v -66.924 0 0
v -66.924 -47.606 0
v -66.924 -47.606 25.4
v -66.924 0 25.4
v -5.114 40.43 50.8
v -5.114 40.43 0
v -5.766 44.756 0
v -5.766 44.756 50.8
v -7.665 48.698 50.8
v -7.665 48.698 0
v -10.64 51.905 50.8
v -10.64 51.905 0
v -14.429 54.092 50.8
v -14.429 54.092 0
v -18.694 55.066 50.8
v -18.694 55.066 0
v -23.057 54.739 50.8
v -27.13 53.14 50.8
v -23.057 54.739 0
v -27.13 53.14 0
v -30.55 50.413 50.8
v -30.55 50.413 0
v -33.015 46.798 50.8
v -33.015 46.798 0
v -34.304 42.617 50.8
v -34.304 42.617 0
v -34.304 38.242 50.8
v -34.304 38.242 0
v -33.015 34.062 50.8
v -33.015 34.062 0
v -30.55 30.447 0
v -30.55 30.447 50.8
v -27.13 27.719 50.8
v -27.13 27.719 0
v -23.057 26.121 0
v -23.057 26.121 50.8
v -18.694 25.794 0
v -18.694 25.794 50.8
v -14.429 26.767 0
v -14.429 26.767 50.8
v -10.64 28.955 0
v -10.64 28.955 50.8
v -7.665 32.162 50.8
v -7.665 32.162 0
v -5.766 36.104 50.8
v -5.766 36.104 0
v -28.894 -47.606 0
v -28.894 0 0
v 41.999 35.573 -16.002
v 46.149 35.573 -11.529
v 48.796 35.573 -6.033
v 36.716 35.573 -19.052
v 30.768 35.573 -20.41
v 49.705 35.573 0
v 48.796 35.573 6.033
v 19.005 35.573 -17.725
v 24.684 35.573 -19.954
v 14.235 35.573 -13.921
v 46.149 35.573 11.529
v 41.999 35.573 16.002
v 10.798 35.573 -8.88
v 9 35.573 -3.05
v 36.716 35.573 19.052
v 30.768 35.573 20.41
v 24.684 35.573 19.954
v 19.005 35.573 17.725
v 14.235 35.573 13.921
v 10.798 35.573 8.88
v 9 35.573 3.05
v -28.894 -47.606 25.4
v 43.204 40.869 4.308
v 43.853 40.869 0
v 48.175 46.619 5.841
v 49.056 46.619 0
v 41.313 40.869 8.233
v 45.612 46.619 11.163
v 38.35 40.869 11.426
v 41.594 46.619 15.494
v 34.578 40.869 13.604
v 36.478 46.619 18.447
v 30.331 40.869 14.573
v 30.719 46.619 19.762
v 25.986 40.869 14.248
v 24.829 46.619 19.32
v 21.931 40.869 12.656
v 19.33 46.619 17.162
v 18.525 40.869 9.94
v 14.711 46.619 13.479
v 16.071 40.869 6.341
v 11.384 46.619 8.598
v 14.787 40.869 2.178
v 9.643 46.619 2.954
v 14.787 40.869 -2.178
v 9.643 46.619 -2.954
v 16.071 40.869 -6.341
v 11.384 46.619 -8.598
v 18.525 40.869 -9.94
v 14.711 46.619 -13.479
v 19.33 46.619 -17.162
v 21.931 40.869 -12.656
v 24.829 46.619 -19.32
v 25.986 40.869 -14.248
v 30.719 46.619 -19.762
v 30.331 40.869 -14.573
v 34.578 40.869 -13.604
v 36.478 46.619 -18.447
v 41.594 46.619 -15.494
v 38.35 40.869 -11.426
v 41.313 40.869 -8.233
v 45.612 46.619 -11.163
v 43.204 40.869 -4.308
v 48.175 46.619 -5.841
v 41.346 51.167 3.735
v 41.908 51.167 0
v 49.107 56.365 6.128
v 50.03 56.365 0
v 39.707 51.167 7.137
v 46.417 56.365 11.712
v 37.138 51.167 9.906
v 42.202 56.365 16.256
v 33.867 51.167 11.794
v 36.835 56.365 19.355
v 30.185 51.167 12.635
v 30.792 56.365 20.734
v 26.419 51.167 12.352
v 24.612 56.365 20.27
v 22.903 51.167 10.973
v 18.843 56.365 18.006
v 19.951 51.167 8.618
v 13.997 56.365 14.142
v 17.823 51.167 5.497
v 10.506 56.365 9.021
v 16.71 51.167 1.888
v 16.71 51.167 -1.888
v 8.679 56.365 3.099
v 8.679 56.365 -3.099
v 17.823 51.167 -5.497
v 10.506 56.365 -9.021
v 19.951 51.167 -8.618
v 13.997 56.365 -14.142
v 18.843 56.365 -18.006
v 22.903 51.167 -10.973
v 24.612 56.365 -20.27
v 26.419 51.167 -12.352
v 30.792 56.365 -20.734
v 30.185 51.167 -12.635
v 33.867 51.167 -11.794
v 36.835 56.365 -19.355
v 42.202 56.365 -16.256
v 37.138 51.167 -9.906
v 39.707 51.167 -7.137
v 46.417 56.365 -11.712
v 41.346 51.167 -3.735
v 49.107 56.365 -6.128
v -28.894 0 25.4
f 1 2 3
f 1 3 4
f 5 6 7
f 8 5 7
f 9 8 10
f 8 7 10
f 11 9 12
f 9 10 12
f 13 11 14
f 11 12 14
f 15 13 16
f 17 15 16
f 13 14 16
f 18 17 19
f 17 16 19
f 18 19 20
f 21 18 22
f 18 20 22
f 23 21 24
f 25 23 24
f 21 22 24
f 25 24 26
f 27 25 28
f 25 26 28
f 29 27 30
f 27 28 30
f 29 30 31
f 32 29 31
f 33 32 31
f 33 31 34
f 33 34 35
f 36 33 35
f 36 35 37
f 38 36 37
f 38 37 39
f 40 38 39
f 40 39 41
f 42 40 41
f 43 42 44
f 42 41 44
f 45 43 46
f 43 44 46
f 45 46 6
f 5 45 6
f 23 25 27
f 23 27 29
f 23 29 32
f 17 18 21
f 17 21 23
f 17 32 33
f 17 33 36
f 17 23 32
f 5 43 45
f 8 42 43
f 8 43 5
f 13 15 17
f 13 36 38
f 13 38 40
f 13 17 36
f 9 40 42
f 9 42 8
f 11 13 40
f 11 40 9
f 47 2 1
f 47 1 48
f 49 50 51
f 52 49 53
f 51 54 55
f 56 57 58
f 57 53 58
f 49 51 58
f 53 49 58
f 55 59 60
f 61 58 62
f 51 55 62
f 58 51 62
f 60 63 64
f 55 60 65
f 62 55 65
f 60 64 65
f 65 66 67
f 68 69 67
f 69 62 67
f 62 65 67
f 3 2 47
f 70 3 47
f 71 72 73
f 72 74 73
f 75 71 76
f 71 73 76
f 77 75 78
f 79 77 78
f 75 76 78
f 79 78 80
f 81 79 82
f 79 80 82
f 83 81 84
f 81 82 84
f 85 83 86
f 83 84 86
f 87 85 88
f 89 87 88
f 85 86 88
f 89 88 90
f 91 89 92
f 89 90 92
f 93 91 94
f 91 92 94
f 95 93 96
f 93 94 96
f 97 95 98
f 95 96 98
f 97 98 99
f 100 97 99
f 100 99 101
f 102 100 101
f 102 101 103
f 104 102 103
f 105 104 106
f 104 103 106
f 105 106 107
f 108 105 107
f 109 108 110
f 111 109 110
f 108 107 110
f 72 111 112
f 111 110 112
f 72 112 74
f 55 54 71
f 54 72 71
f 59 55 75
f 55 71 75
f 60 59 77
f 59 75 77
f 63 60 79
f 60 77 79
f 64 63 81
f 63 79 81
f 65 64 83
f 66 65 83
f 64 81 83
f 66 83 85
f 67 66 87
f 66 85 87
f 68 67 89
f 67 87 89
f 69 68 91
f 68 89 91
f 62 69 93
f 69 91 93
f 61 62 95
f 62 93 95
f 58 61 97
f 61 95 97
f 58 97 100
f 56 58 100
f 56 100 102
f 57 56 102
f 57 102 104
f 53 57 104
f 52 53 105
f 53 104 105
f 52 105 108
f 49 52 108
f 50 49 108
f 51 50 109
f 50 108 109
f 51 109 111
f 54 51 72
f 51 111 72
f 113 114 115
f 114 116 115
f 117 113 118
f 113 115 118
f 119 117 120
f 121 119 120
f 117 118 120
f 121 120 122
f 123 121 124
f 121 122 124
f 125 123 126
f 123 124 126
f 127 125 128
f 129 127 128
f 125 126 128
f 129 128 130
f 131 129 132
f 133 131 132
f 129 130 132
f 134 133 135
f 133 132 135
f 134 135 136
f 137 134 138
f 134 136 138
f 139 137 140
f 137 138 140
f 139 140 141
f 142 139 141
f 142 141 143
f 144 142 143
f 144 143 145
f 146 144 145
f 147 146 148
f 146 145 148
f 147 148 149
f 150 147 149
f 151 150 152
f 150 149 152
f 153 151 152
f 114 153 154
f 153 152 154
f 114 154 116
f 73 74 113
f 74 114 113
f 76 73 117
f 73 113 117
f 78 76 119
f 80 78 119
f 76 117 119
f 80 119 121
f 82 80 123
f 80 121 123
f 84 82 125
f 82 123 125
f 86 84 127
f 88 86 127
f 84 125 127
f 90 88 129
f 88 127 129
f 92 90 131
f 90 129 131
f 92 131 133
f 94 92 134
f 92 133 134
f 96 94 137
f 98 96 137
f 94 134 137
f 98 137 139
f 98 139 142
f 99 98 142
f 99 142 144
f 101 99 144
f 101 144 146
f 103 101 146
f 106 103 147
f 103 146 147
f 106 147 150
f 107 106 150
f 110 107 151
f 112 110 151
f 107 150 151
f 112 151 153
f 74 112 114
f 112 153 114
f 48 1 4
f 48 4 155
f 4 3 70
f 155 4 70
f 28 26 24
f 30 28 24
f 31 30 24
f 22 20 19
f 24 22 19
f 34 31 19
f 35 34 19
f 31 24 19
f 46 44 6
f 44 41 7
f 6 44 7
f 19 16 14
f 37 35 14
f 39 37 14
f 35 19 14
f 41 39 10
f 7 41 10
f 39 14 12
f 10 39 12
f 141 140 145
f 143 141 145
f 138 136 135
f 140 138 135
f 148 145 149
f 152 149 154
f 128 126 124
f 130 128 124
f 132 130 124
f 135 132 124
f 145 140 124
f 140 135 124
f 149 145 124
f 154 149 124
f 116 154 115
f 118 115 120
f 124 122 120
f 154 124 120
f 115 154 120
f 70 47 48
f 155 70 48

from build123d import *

# Parameters (mm, degrees)
F0_W     = 38.029844
F0_H     = 47.606282
F1_DEPTH = 25.4
F2_R     = 14.676864
F3_DEPTH = 50.8


with BuildPart() as f1:
    # F0 (on Top) → F1 (new body)
    with BuildSketch(Plane.XY):
        with Locations((-47.908711, -23.803141)):
            Rectangle(F0_W, F0_H)
    extrude(amount=F1_DEPTH)


with BuildPart() as f3:
    # F2 (on Top) → F3 (new body)
    with BuildSketch(Plane.XY):
        with Locations((-19.791268, 40.429786)):
            Circle(F2_R)
    extrude(amount=F3_DEPTH)


with BuildPart() as f5:
    # F4 (on Top) → F5 (revolve)
    with BuildSketch(Plane.XY):
        Polygon((41.908443, 51.167279), (50.030235, 56.365225), (29.238449, 56.365225), (29.238449, 35.573442), (49.70536, 35.573442), (43.852812, 40.868607), (49.055621, 46.619076), align=None)
    revolve(axis=Axis((29.238449, 45.969333, 0), (0, -1, 0)))


solid = Compound([f1.part, f3.part, f5.part])
